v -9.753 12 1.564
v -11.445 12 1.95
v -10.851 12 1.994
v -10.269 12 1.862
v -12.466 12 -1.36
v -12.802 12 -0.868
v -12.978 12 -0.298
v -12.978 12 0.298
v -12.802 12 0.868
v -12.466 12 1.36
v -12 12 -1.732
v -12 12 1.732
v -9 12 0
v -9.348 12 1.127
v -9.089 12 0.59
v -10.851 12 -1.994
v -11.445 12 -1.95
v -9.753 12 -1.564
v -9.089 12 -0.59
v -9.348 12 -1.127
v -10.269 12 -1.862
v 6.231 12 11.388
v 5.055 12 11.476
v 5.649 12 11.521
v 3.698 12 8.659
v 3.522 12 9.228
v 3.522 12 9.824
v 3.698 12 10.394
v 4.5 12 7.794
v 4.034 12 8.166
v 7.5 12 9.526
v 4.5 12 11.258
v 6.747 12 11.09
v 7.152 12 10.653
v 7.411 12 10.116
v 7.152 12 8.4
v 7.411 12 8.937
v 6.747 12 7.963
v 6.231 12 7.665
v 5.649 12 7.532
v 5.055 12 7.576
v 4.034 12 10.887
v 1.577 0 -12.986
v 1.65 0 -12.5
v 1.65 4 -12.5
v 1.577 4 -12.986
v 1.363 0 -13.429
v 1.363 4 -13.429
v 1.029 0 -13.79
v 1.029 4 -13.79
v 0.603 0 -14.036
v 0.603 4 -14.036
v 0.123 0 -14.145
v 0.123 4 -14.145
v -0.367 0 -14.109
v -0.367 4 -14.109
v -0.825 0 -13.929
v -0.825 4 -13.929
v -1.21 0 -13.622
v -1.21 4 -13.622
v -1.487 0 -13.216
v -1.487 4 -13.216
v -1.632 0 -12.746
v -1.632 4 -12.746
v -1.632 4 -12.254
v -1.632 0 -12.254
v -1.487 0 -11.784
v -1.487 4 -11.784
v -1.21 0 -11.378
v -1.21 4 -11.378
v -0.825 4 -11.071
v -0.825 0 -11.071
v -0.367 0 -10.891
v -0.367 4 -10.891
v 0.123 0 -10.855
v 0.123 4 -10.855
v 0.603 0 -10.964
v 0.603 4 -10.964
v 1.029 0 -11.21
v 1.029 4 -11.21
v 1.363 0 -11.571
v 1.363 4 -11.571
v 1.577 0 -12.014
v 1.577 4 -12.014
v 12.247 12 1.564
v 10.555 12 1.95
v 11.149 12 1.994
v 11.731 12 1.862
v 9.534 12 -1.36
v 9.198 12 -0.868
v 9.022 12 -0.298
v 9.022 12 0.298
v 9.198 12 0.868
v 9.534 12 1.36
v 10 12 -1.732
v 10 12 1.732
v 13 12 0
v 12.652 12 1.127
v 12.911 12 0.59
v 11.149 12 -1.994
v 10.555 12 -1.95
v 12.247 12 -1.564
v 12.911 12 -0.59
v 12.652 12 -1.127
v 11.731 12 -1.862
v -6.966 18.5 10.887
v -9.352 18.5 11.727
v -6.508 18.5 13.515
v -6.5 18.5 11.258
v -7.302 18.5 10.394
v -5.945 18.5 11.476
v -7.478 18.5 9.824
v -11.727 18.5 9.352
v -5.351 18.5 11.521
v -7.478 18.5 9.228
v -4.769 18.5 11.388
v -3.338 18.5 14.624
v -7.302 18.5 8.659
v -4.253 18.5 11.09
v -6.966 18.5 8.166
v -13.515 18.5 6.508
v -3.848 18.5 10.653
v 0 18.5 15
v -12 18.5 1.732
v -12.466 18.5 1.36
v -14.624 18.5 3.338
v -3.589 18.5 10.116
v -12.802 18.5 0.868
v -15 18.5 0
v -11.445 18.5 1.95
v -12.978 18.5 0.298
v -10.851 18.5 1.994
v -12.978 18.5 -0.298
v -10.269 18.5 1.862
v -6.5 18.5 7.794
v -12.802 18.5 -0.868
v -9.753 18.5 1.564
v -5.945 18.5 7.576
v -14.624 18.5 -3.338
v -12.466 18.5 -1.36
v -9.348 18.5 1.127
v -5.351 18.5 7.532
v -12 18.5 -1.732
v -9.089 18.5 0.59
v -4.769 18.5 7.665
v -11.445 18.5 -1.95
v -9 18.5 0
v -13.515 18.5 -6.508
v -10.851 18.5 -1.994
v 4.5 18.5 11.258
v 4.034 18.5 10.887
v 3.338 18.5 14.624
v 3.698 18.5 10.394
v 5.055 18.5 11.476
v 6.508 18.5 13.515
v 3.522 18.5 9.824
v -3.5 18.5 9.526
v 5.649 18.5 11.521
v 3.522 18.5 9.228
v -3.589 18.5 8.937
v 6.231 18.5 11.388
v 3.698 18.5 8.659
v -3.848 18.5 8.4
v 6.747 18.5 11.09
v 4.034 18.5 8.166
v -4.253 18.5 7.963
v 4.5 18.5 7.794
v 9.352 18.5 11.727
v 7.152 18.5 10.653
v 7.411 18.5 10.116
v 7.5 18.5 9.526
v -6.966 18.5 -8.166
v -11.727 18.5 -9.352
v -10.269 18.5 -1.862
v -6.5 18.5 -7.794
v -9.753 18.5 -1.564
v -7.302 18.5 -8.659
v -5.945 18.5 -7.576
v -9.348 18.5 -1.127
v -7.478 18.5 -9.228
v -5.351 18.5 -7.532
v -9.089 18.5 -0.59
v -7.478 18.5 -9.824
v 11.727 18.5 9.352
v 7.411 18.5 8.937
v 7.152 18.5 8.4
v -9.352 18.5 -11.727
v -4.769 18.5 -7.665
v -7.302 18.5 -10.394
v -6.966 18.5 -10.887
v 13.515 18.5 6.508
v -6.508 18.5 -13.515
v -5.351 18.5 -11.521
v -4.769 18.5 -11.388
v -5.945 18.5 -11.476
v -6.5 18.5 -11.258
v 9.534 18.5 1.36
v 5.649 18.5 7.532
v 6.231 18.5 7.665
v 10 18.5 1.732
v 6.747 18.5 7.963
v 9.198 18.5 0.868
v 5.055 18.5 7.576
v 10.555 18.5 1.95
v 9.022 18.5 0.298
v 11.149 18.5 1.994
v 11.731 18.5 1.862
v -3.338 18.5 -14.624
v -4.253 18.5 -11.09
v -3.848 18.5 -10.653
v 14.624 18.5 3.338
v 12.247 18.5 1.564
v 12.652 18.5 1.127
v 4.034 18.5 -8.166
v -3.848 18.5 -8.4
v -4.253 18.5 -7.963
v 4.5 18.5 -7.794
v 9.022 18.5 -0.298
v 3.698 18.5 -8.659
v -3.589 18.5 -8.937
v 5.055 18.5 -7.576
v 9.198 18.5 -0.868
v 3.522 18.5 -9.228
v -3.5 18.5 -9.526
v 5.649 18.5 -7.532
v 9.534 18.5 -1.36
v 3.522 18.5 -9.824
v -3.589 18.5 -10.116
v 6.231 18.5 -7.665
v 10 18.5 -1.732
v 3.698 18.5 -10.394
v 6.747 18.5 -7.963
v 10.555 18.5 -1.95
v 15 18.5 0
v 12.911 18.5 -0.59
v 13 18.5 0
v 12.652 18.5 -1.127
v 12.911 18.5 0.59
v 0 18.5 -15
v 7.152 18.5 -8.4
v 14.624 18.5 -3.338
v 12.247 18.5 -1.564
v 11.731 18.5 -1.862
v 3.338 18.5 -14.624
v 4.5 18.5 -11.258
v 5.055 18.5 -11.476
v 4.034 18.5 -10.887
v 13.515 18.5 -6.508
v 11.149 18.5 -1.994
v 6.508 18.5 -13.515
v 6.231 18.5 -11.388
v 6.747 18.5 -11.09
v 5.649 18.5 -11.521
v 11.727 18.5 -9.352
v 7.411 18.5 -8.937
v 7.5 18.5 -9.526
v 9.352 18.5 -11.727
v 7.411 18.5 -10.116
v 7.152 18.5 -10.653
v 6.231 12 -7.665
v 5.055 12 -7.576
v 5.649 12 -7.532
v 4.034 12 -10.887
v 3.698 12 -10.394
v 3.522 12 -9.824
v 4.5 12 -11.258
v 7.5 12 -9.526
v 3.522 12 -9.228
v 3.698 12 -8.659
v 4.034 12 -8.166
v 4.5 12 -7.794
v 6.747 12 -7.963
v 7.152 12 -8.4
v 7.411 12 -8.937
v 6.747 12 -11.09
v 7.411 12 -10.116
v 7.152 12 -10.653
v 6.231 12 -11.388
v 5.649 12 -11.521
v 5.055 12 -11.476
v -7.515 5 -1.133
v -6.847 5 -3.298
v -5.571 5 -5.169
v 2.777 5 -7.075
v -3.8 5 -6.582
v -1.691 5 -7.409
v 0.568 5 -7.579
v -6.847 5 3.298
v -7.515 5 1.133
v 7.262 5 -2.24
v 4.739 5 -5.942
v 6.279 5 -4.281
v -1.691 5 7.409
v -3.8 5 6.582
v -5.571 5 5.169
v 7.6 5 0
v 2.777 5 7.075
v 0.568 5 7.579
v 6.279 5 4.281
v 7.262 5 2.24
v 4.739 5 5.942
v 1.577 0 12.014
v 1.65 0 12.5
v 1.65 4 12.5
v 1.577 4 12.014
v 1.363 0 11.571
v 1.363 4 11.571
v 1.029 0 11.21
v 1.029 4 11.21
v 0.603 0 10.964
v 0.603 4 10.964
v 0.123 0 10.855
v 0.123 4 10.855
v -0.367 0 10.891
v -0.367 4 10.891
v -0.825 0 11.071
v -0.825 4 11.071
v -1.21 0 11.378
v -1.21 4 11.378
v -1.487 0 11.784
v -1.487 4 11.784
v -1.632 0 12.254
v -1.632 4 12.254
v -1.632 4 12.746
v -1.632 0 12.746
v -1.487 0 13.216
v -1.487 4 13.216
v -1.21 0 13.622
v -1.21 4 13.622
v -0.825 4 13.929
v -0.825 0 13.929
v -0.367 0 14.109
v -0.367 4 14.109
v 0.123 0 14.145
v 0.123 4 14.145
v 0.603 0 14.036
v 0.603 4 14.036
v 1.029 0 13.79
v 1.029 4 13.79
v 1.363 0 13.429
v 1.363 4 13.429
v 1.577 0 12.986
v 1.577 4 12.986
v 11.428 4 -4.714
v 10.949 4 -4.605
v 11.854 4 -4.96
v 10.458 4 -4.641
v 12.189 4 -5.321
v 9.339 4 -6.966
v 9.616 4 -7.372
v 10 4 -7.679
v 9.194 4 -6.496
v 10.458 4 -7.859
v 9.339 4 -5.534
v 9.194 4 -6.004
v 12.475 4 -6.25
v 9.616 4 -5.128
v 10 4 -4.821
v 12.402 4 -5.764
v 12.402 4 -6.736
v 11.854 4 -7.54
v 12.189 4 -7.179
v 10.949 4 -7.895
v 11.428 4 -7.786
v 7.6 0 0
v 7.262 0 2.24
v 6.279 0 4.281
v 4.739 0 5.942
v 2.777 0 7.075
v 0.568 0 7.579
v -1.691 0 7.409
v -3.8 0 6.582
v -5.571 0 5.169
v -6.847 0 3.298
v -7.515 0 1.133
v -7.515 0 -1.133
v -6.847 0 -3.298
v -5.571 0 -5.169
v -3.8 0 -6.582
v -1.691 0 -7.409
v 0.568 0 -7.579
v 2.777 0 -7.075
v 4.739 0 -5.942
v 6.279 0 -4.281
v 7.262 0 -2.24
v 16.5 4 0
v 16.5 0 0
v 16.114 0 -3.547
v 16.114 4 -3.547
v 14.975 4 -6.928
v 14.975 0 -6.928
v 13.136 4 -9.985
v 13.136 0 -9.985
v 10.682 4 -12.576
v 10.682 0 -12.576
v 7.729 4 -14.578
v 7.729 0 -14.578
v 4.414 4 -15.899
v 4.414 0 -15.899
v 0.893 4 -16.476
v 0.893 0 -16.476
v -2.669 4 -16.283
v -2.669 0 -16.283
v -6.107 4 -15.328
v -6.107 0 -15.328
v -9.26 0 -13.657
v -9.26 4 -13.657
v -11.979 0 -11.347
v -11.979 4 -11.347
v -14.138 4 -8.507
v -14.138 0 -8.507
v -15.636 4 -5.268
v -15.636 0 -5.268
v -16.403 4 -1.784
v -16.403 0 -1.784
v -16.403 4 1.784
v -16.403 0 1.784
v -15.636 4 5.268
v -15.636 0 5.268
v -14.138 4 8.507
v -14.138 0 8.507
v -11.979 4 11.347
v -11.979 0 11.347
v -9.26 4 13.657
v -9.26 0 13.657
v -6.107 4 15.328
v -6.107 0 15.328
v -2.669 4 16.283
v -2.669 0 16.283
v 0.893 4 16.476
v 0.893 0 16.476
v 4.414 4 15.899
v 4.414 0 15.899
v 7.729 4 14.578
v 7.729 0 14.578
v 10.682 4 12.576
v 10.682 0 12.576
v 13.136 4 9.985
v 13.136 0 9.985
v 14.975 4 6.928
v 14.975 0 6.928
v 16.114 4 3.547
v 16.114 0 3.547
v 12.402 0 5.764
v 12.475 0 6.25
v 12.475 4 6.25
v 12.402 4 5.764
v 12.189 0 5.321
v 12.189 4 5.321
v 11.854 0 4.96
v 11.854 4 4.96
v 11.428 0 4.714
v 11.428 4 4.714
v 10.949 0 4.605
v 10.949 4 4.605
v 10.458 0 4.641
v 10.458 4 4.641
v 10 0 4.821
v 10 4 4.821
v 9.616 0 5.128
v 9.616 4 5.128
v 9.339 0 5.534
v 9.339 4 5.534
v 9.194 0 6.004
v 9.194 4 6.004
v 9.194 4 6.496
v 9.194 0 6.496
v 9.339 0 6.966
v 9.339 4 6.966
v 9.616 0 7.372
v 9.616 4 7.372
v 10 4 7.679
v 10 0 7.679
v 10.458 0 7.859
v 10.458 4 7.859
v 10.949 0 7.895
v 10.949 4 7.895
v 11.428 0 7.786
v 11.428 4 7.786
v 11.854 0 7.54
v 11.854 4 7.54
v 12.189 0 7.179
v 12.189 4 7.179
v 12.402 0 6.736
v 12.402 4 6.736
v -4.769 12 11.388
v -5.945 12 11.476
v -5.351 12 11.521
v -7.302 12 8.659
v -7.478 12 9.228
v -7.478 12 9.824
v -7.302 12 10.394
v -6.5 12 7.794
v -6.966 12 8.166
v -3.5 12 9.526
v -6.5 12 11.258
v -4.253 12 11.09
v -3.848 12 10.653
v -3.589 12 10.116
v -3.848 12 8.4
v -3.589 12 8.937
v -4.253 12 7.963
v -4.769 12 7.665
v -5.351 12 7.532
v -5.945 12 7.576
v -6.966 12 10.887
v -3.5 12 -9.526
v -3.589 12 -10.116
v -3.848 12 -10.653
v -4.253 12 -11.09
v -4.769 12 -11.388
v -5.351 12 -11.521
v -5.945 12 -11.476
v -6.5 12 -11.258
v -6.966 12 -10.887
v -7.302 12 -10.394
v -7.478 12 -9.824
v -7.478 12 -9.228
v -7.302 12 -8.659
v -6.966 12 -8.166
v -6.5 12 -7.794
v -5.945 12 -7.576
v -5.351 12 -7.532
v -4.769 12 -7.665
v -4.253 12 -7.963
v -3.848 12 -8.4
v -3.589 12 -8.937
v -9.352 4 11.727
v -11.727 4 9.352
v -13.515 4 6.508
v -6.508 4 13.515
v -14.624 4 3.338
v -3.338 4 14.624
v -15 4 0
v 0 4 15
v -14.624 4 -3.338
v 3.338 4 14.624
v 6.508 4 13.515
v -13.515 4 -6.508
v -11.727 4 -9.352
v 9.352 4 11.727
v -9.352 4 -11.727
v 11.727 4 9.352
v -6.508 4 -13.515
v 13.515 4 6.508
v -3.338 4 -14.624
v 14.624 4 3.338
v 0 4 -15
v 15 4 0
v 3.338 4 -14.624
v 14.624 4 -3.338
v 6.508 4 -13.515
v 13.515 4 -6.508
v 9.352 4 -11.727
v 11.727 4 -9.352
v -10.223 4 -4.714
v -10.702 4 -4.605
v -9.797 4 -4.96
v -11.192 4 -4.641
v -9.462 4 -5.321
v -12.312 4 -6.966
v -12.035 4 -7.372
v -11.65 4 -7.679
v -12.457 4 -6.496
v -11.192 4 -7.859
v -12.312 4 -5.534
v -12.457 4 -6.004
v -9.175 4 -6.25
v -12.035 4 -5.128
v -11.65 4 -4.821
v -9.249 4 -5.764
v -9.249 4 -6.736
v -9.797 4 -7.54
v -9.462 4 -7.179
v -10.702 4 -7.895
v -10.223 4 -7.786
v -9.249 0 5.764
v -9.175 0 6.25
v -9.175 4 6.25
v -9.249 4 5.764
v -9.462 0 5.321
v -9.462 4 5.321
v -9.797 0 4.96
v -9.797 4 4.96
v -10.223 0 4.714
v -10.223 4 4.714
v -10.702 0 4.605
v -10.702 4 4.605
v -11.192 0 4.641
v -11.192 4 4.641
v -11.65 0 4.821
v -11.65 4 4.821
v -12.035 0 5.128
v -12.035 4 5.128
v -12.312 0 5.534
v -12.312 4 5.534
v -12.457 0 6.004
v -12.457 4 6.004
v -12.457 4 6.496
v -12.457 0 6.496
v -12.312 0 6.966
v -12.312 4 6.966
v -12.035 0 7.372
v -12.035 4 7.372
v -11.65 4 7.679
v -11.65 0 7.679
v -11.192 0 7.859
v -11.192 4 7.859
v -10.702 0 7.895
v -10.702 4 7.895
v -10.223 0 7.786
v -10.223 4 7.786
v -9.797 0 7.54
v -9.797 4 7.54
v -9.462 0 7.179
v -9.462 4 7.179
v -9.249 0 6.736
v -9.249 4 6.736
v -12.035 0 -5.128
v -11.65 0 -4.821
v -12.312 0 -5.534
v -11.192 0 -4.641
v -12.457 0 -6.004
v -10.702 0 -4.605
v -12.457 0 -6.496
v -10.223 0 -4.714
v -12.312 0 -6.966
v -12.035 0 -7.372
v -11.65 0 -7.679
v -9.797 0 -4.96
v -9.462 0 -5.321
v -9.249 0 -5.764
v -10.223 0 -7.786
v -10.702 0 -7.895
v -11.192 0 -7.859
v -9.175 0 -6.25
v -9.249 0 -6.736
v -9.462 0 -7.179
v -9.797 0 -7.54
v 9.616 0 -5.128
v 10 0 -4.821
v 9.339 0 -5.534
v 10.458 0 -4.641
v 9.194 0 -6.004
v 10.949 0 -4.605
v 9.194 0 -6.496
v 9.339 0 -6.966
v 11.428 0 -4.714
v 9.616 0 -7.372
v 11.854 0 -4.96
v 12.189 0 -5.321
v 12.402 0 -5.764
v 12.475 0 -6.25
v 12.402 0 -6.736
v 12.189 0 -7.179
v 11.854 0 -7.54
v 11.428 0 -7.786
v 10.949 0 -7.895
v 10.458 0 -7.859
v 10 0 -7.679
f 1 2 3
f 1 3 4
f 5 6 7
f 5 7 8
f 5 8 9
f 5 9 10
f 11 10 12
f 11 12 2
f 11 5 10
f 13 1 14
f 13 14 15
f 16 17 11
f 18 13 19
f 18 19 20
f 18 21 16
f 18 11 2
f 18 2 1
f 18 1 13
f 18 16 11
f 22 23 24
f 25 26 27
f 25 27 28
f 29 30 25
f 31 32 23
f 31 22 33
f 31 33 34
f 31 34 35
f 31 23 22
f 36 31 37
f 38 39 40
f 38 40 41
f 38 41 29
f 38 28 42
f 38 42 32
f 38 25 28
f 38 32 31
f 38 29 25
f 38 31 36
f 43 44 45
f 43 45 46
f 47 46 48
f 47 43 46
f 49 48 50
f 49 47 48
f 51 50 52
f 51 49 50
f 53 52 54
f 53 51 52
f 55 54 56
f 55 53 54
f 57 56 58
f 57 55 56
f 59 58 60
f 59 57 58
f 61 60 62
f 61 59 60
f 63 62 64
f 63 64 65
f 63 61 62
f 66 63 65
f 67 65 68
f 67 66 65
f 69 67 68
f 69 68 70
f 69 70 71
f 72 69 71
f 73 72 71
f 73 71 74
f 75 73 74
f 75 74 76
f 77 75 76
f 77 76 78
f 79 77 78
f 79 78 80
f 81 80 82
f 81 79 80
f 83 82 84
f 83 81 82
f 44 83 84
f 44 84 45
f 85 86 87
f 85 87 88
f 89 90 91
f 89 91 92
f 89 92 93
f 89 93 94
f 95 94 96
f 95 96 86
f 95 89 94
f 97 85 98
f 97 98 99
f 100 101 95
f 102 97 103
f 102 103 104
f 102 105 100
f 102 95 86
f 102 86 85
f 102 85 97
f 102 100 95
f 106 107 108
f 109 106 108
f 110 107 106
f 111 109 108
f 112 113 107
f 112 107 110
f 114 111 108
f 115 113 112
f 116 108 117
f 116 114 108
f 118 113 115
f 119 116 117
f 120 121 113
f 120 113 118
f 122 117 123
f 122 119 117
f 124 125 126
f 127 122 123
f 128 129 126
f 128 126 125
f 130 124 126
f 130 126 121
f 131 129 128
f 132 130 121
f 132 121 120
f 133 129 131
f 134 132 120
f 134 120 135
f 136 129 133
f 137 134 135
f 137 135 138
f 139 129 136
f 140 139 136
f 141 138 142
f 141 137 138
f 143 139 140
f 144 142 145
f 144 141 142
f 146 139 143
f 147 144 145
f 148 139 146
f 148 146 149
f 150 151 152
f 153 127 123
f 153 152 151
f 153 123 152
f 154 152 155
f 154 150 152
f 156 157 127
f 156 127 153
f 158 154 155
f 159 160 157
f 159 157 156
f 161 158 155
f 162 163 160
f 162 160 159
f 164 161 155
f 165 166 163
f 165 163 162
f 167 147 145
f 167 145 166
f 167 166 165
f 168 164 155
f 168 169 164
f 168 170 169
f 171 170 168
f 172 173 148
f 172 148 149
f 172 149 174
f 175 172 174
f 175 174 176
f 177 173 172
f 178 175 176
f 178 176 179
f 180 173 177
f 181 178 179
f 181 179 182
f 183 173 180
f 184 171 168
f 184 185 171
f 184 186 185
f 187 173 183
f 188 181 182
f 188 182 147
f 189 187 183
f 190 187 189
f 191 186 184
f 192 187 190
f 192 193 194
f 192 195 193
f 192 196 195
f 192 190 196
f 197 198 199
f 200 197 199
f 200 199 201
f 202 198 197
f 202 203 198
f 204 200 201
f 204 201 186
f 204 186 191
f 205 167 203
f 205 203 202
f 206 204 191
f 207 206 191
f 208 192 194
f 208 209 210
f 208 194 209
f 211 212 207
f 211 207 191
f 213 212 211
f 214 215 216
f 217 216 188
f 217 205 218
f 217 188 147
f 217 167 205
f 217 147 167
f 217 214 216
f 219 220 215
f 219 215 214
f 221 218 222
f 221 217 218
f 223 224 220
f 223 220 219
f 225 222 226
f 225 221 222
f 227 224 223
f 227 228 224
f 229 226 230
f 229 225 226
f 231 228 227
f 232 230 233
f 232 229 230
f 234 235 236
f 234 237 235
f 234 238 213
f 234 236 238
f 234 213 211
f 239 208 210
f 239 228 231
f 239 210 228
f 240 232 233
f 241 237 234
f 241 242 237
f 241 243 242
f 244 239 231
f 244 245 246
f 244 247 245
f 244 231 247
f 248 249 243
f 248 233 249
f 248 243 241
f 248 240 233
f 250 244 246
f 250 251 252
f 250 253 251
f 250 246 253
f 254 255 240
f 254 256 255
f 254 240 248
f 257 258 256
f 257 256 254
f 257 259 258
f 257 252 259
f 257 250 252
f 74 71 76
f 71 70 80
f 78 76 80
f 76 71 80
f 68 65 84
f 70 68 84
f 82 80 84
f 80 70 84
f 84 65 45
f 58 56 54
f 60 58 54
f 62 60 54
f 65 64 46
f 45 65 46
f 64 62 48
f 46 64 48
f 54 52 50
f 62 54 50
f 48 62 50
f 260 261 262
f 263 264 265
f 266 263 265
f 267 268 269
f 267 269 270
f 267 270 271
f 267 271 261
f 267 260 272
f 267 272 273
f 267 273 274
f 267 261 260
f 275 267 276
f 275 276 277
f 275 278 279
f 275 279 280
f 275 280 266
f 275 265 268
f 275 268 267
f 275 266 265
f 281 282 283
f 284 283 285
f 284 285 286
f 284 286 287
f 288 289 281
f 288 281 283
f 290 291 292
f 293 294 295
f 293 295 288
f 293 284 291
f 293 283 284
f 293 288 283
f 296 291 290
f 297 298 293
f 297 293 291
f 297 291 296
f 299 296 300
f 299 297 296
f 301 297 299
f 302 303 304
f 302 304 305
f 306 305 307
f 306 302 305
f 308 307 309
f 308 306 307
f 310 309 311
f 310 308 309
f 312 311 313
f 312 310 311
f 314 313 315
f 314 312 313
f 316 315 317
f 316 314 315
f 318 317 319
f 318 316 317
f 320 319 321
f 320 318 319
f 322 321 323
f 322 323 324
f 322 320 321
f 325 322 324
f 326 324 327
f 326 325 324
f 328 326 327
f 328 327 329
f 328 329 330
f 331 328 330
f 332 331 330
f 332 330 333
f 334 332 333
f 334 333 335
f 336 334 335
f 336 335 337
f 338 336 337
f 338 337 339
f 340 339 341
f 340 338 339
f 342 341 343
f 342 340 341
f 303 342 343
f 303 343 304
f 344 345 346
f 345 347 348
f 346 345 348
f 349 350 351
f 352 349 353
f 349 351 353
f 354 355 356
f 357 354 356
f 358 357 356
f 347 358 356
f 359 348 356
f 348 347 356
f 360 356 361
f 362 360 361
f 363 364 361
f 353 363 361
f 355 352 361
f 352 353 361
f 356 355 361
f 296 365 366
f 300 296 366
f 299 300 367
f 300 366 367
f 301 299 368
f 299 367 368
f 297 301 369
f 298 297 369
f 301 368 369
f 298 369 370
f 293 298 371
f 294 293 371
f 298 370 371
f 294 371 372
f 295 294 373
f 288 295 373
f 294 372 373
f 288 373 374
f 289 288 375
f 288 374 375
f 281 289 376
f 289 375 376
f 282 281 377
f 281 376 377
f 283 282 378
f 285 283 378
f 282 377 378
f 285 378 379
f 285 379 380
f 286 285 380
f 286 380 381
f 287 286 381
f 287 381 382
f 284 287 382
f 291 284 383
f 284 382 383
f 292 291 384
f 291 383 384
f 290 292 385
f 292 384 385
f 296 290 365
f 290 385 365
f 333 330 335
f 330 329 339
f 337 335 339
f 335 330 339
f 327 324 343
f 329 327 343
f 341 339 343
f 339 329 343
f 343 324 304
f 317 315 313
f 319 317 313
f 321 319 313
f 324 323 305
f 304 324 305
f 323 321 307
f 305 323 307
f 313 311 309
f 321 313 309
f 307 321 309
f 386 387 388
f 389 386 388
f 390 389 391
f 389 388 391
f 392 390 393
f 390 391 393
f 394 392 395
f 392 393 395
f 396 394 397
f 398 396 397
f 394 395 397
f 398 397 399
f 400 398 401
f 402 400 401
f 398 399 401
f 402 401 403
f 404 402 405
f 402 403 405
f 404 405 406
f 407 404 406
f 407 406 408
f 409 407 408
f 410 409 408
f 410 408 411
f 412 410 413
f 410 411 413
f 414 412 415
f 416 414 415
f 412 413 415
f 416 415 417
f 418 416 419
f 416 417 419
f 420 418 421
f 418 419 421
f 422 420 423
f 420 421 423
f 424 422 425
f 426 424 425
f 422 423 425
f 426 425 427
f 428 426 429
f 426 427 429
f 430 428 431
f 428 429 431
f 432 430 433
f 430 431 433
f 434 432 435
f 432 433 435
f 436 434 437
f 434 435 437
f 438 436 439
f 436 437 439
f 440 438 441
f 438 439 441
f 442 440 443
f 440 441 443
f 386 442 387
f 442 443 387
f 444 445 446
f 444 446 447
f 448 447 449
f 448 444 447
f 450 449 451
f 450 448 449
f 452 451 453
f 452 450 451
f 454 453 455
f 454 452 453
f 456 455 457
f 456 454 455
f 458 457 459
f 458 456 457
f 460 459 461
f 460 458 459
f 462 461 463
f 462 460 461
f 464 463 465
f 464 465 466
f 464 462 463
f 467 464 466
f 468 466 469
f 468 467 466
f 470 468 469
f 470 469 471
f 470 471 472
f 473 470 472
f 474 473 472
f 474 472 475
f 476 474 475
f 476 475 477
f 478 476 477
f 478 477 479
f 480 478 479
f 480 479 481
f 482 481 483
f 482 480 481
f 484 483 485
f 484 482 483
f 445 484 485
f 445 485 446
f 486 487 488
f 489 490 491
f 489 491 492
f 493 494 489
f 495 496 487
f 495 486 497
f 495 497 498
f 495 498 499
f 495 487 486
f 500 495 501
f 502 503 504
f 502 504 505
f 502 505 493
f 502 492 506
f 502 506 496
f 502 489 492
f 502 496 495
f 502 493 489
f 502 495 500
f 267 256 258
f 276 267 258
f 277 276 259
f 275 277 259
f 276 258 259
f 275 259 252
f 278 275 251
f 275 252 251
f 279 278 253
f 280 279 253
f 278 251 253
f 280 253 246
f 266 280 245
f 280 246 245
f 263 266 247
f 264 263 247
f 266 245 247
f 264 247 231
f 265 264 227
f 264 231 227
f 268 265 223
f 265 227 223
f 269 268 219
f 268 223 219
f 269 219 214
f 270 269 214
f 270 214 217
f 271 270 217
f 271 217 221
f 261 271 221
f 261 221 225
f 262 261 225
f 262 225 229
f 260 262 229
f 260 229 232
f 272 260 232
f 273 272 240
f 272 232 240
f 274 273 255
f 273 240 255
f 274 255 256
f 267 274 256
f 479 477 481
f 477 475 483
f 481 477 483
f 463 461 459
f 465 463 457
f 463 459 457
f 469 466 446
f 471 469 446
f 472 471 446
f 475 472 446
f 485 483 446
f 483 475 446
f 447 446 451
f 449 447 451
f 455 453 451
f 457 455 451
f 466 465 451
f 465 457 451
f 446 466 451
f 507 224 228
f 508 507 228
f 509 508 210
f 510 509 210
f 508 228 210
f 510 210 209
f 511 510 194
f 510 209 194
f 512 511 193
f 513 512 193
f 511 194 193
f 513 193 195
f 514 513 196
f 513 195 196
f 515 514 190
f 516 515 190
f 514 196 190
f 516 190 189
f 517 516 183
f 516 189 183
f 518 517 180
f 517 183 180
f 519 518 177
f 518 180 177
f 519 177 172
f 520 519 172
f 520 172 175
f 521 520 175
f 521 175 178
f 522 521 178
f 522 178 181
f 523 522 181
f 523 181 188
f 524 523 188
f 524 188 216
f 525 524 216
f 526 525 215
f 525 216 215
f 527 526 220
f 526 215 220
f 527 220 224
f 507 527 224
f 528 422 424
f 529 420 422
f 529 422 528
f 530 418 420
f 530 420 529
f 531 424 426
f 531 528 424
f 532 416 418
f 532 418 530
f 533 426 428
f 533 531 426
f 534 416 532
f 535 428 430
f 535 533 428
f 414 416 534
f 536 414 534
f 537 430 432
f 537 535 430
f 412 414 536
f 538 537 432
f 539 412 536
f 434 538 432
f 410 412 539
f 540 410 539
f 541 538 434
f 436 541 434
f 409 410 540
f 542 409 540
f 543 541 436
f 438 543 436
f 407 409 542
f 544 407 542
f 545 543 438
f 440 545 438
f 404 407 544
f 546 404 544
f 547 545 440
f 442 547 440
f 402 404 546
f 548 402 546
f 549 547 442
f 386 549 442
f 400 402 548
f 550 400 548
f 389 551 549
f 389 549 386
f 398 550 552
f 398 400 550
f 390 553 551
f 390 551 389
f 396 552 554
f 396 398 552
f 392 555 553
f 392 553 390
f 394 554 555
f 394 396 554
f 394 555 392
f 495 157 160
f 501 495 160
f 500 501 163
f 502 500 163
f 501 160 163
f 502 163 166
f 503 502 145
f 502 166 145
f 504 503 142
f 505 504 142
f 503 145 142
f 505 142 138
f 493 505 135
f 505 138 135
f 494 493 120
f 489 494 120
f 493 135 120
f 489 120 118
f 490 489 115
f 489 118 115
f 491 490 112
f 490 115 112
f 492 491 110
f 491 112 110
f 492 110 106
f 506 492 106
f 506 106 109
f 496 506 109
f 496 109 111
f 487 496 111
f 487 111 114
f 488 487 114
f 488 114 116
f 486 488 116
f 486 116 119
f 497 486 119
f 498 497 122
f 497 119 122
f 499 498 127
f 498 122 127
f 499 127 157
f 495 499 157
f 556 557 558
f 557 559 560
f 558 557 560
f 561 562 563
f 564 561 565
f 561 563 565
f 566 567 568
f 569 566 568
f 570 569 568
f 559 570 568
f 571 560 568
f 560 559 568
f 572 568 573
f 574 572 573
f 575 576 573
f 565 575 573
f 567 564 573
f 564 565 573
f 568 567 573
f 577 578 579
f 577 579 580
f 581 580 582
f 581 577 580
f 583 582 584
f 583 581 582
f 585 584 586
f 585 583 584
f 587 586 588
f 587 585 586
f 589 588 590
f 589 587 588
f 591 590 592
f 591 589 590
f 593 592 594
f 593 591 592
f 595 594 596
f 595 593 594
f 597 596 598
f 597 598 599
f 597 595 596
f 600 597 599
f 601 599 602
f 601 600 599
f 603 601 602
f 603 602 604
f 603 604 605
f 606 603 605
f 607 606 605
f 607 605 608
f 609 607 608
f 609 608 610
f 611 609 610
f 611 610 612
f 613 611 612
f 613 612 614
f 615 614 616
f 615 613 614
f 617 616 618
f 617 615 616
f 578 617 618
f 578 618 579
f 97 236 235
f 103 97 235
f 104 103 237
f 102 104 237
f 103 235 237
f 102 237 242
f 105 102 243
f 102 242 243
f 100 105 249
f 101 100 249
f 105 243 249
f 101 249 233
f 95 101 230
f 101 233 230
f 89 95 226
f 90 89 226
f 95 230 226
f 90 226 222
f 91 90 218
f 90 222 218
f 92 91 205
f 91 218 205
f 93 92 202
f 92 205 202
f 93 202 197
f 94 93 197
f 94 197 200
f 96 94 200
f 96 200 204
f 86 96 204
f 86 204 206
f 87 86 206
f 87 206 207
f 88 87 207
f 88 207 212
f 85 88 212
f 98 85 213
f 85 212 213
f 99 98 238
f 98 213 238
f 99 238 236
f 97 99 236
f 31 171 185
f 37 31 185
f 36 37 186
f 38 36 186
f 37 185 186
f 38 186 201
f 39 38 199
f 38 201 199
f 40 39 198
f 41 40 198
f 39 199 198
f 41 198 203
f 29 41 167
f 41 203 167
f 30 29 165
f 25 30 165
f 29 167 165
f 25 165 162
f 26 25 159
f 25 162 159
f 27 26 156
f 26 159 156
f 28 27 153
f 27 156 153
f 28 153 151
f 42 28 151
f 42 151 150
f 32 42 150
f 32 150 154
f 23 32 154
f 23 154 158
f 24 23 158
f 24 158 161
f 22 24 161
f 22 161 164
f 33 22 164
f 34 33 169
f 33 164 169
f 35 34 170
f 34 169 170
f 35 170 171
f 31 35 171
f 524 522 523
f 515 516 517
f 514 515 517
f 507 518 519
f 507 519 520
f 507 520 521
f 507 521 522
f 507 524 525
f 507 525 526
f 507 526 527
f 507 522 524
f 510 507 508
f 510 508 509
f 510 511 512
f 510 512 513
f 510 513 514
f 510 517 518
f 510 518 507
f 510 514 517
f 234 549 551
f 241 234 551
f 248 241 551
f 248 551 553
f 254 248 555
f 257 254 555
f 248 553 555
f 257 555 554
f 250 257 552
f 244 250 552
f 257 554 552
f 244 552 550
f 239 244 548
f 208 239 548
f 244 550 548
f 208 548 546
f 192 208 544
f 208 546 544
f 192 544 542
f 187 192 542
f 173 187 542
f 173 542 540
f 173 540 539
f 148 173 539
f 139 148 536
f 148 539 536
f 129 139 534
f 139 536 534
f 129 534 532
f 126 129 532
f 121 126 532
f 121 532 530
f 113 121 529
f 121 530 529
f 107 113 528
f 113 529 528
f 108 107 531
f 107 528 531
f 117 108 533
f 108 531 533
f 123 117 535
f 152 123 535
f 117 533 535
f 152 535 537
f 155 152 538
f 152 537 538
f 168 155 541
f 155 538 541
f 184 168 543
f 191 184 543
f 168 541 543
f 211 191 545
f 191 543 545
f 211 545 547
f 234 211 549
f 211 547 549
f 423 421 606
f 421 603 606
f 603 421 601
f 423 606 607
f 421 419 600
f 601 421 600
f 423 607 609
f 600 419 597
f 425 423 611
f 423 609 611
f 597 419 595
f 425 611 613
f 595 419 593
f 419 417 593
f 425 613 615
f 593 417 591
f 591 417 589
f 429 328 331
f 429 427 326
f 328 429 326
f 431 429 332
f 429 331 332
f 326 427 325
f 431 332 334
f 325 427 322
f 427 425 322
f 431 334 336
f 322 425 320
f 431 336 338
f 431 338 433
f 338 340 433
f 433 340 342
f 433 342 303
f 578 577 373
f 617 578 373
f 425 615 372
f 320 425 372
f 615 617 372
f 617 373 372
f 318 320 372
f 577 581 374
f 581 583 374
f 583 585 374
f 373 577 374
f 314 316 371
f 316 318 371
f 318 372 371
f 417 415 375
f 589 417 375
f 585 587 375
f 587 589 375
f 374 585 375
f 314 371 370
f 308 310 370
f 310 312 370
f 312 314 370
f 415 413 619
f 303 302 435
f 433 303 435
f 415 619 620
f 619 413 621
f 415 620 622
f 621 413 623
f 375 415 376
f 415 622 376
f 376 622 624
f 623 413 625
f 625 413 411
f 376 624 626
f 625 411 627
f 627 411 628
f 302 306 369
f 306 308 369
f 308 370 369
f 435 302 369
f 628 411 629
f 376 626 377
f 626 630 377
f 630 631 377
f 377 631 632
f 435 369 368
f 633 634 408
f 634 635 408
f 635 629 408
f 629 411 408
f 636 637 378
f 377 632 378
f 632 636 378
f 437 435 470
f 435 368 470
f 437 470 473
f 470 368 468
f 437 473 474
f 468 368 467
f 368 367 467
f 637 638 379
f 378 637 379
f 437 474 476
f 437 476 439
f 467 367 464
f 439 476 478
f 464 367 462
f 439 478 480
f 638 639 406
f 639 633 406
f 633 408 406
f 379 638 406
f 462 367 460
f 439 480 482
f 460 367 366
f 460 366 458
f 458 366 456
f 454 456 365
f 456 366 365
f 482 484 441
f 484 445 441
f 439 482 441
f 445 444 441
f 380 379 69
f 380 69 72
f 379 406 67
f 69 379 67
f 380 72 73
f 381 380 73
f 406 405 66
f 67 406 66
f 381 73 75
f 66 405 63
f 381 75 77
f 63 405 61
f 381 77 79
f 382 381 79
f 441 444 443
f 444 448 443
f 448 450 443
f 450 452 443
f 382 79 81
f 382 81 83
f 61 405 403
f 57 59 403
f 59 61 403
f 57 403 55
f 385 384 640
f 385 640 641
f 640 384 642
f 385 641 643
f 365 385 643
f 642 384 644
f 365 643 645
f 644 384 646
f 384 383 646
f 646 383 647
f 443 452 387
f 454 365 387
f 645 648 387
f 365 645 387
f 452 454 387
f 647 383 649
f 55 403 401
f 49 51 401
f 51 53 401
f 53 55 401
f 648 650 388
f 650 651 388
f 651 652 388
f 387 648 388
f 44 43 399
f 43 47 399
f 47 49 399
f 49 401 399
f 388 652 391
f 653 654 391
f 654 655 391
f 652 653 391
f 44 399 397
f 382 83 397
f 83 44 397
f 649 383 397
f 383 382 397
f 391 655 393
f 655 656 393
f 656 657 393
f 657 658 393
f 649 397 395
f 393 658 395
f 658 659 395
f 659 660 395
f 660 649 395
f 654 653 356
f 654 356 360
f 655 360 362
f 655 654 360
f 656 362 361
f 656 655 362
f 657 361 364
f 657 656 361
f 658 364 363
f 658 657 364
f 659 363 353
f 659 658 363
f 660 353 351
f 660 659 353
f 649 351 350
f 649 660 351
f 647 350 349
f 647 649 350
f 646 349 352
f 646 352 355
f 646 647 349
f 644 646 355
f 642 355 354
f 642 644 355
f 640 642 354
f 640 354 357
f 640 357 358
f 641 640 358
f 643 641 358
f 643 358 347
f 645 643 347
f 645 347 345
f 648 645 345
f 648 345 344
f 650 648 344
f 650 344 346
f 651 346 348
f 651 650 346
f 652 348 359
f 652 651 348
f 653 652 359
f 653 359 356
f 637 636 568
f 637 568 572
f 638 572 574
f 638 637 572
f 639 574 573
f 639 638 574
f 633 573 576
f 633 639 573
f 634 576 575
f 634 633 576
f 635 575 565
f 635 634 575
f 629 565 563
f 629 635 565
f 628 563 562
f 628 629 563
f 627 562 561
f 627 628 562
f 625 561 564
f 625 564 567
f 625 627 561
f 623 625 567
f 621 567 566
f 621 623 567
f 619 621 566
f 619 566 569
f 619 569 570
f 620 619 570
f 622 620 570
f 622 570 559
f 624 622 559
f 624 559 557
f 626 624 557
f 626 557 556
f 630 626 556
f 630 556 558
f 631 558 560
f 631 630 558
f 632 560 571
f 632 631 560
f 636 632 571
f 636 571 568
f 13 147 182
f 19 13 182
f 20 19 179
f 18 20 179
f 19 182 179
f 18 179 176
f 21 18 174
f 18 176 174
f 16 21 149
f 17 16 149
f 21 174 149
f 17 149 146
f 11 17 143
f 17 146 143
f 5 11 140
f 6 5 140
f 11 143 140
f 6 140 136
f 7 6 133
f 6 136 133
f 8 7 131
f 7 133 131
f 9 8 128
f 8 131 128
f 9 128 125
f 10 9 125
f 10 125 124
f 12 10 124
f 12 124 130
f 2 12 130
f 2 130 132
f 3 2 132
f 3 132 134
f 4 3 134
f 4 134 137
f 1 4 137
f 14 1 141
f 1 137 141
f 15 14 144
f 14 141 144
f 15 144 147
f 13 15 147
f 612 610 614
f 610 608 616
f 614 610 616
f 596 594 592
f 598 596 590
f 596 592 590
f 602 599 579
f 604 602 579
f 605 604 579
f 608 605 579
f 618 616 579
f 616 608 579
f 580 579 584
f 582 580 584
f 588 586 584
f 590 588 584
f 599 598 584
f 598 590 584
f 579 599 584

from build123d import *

# Parameters (mm, degrees)
SKETCH1_R           = 16.5
SKETCH1_R_2         = 1.65
BOSS_EXTRUDE1_DEPTH = 4
SKETCH2_R           = 15
BOSS_EXTRUDE2_DEPTH = 14.5
SKETCH5_R           = 2
CUT_EXTRUDE3_DEPTH  = 6.5
SKETCH6_R           = 7.6
CUT_EXTRUDE4_DEPTH  = 5


with BuildPart() as part:
    # Sketch1 → Boss-Extrude1 (new body)
    with BuildSketch(Plane(origin=(0, 0, 0), x_dir=(1, 0, 0), z_dir=(0, 1, 0))):
        Circle(SKETCH1_R)
        with Locations((0, 12.5)):
            Circle(SKETCH1_R_2, mode=Mode.SUBTRACT)
        with Locations((10.825317547, 6.25)):
            Circle(SKETCH1_R_2, mode=Mode.SUBTRACT)
        with Locations((10.825317547, -6.25)):
            Circle(SKETCH1_R_2, mode=Mode.SUBTRACT)
        with Locations((0, -12.5)):
            Circle(SKETCH1_R_2, mode=Mode.SUBTRACT)
        with Locations((-10.825317547, -6.25)):
            Circle(SKETCH1_R_2, mode=Mode.SUBTRACT)
        with Locations((-10.825317547, 6.25)):
            Circle(SKETCH1_R_2, mode=Mode.SUBTRACT)
    extrude(amount=BOSS_EXTRUDE1_DEPTH)

    # Sketch2 → Boss-Extrude2 (add)
    with BuildSketch(Plane(origin=(0, 4, 0), x_dir=(1, 0, 0), z_dir=(0, 1, 0))):
        Circle(SKETCH2_R)
    extrude(amount=BOSS_EXTRUDE2_DEPTH)

    # Sketch5 → Cut-Extrude3 (cut)
    with BuildSketch(Plane(origin=(0, 18.5, 0), x_dir=(1, 0, 0), z_dir=(0, 1, 0))):
        with Locations((-11, 0)):
            Circle(SKETCH5_R)
        with Locations((-5.5, 9.526279442)):
            Circle(SKETCH5_R)
        with Locations((5.5, 9.526279442)):
            Circle(SKETCH5_R)
        with Locations((11, 0)):
            Circle(SKETCH5_R)
        with Locations((5.5, -9.526279442)):
            Circle(SKETCH5_R)
        with Locations((-5.5, -9.526279442)):
            Circle(SKETCH5_R)
    extrude(amount=-CUT_EXTRUDE3_DEPTH, mode=Mode.SUBTRACT)

    # Sketch6 → Cut-Extrude4 (cut)
    with BuildSketch(Plane.XZ):
        Circle(SKETCH6_R)
    extrude(amount=-CUT_EXTRUDE4_DEPTH, mode=Mode.SUBTRACT)


solid = part.part
